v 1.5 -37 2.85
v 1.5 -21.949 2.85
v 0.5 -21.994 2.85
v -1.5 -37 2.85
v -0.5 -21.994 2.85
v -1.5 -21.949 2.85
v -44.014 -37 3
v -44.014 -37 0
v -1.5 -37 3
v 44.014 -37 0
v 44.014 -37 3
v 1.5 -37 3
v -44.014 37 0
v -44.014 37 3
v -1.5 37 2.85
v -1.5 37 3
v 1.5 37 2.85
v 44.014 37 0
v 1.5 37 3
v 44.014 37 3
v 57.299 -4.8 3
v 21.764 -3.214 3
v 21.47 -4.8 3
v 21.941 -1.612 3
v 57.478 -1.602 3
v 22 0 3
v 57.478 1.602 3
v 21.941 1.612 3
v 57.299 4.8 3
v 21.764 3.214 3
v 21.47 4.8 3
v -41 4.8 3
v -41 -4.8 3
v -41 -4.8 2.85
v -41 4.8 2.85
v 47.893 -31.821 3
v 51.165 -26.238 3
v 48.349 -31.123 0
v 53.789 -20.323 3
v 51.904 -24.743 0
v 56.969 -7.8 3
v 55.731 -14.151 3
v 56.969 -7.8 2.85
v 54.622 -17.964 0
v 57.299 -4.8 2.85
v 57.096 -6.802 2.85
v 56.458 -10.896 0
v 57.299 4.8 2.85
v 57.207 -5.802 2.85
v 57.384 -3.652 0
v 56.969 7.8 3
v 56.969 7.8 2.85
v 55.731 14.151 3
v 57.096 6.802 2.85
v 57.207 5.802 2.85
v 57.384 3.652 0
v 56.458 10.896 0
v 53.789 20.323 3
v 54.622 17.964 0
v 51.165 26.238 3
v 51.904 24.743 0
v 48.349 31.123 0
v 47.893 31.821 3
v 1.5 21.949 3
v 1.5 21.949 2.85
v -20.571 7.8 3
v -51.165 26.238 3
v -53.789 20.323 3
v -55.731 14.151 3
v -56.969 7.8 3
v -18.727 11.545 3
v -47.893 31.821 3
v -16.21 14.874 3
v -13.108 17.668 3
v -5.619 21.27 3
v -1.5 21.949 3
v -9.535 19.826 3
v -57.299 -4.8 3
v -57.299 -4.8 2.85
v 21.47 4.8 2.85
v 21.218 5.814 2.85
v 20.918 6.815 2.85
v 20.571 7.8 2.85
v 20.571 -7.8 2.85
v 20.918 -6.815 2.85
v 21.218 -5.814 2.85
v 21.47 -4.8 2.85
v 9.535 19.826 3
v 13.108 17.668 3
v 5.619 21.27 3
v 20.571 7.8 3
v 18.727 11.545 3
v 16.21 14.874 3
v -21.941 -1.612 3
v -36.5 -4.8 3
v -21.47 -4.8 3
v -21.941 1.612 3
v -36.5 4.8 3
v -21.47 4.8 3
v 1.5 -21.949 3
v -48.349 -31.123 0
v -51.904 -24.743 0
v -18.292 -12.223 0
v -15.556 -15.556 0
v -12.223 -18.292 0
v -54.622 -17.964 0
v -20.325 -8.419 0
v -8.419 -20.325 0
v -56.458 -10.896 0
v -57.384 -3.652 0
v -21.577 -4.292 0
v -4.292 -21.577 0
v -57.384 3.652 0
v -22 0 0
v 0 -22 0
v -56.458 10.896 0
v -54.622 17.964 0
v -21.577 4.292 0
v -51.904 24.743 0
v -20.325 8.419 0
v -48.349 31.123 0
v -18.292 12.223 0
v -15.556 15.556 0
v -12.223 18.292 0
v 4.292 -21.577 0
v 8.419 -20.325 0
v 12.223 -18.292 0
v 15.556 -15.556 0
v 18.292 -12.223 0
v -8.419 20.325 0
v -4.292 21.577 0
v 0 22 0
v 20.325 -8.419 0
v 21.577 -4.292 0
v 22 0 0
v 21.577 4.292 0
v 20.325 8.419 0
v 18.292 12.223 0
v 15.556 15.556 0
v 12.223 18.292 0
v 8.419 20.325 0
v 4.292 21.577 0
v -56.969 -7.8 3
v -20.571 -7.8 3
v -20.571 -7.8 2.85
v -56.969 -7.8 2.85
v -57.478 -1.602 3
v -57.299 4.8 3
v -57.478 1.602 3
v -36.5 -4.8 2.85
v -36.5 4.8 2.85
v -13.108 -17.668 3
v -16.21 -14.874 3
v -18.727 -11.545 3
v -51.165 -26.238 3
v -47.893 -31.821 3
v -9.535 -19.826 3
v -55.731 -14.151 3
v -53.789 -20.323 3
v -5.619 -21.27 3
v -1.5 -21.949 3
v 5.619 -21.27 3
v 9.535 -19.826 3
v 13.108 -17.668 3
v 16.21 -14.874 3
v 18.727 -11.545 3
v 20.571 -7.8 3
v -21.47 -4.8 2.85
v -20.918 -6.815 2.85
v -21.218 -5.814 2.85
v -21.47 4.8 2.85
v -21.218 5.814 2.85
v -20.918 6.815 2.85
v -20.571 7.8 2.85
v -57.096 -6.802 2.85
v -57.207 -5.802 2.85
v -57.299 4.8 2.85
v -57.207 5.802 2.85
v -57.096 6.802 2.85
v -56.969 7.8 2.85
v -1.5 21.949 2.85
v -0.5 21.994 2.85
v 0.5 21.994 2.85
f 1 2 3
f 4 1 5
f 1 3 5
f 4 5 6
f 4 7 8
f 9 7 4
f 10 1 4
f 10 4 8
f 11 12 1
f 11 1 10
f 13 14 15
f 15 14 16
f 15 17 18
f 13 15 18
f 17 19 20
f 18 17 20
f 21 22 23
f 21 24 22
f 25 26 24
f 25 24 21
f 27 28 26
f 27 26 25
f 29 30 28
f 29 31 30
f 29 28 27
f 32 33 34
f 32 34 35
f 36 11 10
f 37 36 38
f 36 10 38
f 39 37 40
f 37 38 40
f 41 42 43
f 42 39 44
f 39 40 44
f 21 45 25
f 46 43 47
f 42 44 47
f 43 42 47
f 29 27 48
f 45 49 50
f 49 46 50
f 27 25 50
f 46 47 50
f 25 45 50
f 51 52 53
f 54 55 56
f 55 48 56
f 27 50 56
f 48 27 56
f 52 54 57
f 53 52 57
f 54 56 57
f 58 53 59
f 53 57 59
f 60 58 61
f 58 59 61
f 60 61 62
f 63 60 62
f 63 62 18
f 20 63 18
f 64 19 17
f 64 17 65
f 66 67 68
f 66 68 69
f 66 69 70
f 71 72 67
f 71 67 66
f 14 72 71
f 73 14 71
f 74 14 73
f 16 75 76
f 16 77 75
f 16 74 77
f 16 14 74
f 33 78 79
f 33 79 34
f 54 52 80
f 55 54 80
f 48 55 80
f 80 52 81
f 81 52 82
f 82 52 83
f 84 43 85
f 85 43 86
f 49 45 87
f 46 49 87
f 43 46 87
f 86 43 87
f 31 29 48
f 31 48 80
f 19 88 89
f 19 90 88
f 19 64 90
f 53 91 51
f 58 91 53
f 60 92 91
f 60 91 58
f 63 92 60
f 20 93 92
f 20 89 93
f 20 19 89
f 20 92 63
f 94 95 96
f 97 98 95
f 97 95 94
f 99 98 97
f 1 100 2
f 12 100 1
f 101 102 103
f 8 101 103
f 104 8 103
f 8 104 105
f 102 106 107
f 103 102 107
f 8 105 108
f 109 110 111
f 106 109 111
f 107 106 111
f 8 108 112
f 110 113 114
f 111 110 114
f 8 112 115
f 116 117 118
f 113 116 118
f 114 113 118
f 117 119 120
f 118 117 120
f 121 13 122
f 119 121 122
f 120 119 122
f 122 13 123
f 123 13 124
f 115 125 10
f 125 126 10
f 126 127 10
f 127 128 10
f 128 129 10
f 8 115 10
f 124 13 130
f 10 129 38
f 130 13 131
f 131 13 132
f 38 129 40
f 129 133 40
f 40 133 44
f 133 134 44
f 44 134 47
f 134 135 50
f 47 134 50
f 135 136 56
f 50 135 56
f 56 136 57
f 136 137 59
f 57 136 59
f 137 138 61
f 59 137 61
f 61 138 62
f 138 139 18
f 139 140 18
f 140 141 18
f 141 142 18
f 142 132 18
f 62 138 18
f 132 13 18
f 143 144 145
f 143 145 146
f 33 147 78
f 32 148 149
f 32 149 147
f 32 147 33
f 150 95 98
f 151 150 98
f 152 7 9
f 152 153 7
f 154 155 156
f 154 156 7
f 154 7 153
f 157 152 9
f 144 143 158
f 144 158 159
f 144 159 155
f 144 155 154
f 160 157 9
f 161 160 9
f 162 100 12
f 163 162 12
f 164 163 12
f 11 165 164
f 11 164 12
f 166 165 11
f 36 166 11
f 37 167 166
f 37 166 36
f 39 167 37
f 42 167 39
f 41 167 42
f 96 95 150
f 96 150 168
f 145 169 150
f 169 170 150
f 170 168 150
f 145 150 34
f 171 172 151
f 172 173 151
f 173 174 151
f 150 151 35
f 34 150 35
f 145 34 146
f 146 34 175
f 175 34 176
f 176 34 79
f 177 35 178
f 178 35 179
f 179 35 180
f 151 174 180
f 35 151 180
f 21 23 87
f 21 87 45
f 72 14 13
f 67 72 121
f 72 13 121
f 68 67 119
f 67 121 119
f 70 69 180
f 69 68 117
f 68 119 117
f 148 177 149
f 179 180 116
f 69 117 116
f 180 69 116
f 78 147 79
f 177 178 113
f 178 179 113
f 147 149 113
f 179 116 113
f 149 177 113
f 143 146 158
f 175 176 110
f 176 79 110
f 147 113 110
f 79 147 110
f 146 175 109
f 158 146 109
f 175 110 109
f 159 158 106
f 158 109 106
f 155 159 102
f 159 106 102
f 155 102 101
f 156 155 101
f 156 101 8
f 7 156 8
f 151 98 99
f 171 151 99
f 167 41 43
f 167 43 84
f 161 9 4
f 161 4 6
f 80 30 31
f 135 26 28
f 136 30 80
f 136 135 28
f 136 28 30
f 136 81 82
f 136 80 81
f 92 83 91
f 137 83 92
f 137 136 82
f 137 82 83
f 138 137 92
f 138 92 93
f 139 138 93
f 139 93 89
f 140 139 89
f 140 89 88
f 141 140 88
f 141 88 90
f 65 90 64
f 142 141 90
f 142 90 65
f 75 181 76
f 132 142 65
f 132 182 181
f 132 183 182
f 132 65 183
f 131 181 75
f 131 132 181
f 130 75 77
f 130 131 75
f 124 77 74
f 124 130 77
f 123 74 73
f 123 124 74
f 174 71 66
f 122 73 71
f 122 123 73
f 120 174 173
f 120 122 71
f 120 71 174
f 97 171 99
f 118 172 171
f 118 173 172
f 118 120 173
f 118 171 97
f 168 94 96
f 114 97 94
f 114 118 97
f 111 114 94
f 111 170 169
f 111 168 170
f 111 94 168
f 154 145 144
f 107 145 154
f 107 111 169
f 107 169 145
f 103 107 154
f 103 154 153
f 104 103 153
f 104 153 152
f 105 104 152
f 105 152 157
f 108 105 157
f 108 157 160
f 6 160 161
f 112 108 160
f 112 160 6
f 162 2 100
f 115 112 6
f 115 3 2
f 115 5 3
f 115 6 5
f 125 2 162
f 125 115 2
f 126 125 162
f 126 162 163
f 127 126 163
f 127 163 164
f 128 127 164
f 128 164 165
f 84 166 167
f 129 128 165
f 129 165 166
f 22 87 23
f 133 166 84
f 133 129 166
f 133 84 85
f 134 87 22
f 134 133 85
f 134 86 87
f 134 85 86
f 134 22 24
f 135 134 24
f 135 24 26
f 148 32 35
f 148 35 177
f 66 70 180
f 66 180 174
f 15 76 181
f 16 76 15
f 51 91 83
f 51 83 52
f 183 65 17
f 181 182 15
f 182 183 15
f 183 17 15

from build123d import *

# Parameters (mm, degrees)
SKETCH_1_R          = 57.5
SKETCH_1_R_2        = 22
EXTRUDE_1_DEPTH     = 3
SKETCH_2_W          = 140.517246729
SKETCH_2_H          = 54.837850232
SKETCH_2_H_2        = 57.45712313
CUT_EXTRUDE_1_DEPTH = 82.372599811
SKETCH_3_W          = 35
SKETCH_3_H          = 9.6
CUT_EXTRUDE_2_DEPTH = 0.15


with BuildPart() as part:
    # Эскиз1 → Бобышка-Вытянуть1 (new body)
    with BuildSketch(Plane.XY):
        Circle(SKETCH_1_R)
        Circle(SKETCH_1_R_2, mode=Mode.SUBTRACT)
    extrude(amount=EXTRUDE_1_DEPTH)

    # Эскиз2 → Вырез-Вытянуть1 (cut, through all)
    with BuildSketch(Plane.XY.offset(3)):
        with Locations((-1.418485275, 64.418925116)):
            Rectangle(SKETCH_2_W, SKETCH_2_H)
        with Locations((-1.418485275, -65.728561565)):
            Rectangle(SKETCH_2_W, SKETCH_2_H_2)
    extrude(amount=-CUT_EXTRUDE_1_DEPTH, mode=Mode.SUBTRACT)

    # Эскиз3 → Вырез-Вытянуть2 (cut)
    with BuildSketch(Plane.XY.offset(3)):
        Polygon((-1.5, 37), (1.5, 37), (1.5, 7.8), (63.743793757, 7.8), (63.743793757, 4.8), (1.5, 4.8), (1.5, -4.8), (65.582153435, -4.8), (65.582153435, -7.8), (1.5, -7.8), (1.5, -37), (-1.5, -37), (-1.5, -7.8), (-73.634100968, -7.8), (-73.634100968, -4.8), (-41, -4.8), (-41, 4.8), (-72.371033765, 4.8), (-72.371033765, 7.8), (-1.5, 7.8), align=None)
        with Locations((-19, 0)):
            Rectangle(SKETCH_3_W, SKETCH_3_H, mode=Mode.SUBTRACT)
    extrude(amount=-CUT_EXTRUDE_2_DEPTH, mode=Mode.SUBTRACT)


solid = part.part
